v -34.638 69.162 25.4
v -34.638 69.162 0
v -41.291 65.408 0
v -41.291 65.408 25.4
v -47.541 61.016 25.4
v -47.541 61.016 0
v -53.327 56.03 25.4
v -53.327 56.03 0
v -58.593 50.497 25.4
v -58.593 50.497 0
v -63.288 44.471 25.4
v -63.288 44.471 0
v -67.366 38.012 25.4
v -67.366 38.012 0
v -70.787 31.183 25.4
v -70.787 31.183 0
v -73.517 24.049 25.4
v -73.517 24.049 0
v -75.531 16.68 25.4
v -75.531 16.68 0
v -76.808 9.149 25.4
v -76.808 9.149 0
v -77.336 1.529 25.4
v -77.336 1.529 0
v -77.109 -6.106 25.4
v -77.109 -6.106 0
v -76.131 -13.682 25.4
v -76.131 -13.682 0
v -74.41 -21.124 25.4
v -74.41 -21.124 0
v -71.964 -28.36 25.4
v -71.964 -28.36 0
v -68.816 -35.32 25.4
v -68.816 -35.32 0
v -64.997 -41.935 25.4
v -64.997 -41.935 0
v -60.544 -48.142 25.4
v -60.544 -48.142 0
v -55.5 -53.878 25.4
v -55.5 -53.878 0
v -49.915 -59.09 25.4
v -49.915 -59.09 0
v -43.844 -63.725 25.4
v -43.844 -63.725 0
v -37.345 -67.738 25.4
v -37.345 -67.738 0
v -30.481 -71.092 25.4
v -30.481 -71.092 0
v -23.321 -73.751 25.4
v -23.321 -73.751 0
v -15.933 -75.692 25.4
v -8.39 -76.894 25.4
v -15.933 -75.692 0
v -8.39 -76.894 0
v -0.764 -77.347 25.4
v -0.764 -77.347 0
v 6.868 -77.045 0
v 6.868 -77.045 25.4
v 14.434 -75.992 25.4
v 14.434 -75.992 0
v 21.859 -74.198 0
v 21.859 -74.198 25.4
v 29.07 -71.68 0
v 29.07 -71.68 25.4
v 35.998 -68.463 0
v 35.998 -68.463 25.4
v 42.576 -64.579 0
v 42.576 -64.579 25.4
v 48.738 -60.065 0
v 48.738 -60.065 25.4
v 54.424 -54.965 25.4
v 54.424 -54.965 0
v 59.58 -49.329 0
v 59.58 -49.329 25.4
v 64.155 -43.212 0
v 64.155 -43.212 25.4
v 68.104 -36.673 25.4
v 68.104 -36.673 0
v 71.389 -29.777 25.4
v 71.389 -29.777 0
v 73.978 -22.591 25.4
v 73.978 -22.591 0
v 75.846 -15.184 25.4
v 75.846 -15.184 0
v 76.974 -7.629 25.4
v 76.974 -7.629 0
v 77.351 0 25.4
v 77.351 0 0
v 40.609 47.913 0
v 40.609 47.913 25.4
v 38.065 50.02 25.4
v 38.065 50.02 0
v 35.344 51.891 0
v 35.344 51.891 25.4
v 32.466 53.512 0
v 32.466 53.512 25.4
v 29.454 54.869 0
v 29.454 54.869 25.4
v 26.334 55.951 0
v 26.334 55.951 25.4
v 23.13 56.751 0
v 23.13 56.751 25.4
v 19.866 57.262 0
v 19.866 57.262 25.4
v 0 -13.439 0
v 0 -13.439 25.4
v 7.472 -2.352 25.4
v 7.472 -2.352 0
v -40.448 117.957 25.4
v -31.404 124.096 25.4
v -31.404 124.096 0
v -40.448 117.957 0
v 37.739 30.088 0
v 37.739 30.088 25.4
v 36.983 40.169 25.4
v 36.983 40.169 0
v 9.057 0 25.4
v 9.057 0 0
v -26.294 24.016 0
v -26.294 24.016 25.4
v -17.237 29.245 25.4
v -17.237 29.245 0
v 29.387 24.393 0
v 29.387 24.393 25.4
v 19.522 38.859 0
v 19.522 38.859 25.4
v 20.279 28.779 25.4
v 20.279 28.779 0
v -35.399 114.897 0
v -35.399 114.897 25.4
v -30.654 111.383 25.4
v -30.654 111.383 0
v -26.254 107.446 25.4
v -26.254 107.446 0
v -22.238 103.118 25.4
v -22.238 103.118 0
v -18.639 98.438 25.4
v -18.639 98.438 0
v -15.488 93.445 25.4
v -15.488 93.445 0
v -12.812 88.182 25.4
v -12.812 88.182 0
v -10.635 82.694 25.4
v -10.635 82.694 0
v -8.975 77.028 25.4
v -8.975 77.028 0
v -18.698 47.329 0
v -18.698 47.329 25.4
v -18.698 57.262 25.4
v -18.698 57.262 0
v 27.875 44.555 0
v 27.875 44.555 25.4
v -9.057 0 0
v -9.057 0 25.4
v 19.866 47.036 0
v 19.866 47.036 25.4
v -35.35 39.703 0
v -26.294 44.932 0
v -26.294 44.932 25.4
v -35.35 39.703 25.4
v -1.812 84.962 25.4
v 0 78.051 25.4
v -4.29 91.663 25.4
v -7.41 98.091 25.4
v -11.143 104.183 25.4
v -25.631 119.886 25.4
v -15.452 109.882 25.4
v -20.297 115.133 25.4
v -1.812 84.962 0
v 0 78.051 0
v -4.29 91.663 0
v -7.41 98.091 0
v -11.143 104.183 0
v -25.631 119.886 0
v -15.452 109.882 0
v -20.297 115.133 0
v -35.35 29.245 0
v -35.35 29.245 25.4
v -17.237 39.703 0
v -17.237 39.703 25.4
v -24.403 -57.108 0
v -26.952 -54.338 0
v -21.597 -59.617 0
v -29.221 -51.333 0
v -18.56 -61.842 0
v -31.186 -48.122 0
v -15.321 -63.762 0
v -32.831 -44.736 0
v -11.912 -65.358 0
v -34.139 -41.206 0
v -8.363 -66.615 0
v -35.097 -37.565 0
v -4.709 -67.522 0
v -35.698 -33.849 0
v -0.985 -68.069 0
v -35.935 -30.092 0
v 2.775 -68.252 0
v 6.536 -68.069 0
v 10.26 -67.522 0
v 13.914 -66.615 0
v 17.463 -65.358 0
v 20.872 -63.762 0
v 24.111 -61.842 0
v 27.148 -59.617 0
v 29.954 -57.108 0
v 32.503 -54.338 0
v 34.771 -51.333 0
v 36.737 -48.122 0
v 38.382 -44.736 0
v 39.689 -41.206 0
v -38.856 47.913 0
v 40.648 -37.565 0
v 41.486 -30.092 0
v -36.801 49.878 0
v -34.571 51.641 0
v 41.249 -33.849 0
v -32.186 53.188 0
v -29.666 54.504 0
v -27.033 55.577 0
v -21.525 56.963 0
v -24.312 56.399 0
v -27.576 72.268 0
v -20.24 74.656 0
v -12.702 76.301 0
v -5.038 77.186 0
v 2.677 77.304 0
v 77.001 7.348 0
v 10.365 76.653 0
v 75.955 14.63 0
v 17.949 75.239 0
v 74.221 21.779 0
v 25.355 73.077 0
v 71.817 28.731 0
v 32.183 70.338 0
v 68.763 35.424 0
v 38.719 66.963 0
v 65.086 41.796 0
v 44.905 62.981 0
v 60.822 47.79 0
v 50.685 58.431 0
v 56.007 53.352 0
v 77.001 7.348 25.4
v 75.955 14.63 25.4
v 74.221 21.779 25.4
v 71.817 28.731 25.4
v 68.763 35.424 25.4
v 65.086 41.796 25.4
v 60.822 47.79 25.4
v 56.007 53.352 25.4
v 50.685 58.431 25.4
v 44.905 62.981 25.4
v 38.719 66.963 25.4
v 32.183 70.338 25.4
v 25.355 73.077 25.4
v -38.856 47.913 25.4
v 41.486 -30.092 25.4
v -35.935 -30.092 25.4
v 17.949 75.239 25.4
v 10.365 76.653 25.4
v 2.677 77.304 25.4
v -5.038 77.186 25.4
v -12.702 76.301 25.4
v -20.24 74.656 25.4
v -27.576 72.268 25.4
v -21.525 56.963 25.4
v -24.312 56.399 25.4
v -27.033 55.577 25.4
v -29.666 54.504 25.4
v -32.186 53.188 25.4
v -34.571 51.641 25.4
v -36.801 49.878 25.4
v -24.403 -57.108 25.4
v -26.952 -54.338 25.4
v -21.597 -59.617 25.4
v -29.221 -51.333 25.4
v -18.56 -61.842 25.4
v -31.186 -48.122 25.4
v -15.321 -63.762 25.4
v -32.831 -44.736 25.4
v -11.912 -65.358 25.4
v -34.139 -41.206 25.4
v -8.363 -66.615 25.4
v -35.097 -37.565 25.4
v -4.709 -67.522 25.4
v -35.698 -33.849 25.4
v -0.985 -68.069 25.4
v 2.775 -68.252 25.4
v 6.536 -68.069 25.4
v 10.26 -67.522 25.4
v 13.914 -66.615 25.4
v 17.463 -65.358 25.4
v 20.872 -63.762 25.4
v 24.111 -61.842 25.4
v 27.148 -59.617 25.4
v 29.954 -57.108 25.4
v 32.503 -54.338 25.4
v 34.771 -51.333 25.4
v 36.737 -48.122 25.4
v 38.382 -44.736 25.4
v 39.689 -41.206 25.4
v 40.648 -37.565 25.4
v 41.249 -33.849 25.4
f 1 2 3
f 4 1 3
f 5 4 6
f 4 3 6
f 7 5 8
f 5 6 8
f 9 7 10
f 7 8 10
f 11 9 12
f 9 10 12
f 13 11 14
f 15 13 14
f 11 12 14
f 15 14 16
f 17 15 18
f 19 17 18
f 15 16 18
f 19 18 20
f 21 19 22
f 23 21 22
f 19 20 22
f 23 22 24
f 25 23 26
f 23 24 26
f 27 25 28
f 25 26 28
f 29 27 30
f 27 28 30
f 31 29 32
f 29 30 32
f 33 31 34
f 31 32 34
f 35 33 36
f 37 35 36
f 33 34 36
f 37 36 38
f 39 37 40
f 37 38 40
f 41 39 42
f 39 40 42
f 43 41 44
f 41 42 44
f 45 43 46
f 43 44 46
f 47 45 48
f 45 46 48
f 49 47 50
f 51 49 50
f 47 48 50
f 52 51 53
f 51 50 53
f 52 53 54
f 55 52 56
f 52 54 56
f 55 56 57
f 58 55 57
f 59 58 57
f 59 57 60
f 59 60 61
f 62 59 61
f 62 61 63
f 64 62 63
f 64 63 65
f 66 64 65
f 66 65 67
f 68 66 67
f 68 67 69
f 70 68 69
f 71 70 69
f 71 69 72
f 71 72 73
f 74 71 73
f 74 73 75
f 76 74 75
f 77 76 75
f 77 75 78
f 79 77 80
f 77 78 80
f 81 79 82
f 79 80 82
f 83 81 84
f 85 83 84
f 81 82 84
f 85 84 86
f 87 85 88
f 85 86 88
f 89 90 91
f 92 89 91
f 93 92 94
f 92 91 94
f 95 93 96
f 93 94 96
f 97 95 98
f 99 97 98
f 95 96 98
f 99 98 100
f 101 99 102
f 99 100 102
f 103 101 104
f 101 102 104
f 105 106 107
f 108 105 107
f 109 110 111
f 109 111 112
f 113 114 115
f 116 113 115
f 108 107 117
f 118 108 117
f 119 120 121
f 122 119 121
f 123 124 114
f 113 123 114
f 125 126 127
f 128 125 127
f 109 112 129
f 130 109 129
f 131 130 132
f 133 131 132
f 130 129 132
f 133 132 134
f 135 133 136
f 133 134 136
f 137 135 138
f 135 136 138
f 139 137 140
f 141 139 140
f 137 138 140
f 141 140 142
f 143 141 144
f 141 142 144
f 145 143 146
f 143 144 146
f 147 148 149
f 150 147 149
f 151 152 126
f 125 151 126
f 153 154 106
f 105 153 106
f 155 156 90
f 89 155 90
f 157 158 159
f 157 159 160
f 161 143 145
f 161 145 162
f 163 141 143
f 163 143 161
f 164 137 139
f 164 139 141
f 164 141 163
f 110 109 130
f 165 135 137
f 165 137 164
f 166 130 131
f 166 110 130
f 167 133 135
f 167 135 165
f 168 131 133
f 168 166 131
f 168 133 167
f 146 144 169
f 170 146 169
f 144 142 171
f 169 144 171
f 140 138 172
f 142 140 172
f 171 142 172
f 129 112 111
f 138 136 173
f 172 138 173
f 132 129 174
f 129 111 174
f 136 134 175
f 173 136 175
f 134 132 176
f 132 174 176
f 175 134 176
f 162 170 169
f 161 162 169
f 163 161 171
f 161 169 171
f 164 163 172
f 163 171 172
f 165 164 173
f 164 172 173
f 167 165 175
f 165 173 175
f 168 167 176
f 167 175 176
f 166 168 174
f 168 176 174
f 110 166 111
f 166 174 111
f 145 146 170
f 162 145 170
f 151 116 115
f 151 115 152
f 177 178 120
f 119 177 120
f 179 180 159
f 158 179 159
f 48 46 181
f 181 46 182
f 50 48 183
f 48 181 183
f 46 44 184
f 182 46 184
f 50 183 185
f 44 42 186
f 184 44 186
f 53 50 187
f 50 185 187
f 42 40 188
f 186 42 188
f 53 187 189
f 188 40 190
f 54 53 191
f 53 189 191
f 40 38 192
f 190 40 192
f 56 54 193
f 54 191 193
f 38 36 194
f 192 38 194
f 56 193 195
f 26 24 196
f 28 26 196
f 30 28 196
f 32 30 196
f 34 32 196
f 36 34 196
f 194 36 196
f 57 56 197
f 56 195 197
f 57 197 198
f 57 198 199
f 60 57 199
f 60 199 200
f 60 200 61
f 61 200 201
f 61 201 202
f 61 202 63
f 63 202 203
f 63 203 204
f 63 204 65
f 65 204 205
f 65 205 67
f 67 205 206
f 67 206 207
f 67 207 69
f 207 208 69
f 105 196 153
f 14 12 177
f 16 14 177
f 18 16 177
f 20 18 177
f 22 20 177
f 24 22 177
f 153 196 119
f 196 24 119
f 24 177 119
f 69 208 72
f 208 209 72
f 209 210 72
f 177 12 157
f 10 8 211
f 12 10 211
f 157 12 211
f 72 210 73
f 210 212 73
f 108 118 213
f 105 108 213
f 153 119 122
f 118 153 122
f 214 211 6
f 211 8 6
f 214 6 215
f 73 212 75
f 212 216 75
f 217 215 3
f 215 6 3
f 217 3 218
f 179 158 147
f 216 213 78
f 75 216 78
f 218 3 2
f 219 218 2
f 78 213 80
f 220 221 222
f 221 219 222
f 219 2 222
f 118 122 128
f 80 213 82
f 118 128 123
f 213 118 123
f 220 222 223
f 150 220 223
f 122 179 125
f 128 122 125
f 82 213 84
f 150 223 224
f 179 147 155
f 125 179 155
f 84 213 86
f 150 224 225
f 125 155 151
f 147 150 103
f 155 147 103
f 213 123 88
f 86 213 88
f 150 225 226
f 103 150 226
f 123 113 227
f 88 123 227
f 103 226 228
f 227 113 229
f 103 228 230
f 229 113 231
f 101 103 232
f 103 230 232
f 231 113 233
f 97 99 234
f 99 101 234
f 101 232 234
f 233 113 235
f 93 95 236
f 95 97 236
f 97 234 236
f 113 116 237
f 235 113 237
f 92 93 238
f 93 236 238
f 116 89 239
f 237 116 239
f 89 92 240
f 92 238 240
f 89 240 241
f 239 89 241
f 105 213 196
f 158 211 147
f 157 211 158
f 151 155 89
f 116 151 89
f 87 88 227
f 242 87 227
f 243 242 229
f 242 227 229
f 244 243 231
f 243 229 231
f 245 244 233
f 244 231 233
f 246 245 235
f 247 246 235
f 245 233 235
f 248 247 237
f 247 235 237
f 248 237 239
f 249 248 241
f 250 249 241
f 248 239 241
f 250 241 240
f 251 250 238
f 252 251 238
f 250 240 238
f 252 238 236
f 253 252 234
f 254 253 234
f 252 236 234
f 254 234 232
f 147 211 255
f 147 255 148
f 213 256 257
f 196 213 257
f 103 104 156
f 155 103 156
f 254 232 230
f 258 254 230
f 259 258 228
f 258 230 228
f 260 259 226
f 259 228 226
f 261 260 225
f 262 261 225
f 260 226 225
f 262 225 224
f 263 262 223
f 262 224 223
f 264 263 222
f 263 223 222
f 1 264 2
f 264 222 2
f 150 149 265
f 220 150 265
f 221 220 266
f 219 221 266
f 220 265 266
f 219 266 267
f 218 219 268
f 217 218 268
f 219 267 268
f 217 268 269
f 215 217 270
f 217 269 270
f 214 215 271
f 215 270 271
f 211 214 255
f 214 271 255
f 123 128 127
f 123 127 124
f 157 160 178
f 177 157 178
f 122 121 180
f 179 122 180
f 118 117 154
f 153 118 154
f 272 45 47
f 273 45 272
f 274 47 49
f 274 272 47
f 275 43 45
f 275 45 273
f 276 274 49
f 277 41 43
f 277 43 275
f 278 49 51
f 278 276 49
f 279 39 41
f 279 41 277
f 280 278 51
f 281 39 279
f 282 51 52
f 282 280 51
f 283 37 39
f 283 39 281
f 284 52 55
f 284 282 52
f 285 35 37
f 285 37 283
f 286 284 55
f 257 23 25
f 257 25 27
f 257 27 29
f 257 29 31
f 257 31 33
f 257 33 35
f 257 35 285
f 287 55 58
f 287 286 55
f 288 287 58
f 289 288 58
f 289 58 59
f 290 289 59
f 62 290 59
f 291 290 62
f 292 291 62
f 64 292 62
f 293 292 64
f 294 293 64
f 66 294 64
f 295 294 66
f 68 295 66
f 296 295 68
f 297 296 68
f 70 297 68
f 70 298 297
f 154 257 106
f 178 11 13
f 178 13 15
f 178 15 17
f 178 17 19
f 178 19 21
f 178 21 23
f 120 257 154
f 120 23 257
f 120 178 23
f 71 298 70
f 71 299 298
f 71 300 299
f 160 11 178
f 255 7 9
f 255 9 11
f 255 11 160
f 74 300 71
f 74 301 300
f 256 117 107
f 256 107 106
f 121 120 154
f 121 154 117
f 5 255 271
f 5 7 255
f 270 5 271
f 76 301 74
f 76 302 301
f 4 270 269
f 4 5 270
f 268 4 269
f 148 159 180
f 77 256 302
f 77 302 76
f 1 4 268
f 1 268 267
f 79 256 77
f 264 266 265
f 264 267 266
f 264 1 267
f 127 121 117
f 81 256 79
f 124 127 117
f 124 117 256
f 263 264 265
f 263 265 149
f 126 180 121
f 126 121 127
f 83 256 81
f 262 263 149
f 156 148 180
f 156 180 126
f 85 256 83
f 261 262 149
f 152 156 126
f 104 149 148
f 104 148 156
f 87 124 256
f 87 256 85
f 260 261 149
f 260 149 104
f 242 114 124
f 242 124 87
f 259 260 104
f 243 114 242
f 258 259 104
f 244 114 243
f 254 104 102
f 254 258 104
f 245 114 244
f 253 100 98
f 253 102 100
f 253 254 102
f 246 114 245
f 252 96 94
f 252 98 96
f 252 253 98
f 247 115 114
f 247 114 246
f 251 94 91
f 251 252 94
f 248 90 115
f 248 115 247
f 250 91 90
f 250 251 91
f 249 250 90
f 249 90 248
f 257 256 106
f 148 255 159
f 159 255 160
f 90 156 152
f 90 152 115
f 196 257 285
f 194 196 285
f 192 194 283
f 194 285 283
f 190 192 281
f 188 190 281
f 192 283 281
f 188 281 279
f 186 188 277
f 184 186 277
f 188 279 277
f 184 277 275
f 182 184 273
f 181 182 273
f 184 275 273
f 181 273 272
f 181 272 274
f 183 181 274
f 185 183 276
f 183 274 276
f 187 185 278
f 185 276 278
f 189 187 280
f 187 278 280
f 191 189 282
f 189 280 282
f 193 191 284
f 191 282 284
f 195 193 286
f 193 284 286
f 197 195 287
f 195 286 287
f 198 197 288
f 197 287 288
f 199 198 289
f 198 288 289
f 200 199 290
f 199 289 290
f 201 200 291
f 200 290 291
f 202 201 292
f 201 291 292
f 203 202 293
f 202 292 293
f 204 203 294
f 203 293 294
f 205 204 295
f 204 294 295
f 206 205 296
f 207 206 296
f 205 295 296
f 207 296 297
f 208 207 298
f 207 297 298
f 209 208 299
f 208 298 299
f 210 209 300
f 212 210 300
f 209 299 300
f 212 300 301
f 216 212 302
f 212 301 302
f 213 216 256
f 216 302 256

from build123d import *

# Parameters (mm, degrees)
F1_DEPTH  = 25.4
F3_DEPTH  = 25.4
F5_DEPTH  = 25.4
F7_DEPTH  = 25.4
F9_DEPTH  = 25.4
F11_DEPTH = 25.4


with BuildPart() as f1:
    # F0 (on Top) → F1 (new body)
    with BuildSketch(Plane.XY):
        with BuildLine():
            ThreePointArc((-34.638211, 69.161595), (-40.64383, -65.811937), (77.350707, 0))
            ThreePointArc((77.350707, 0), (63.02527, 44.843587), (25.355131, 73.077009))
            ThreePointArc((25.355131, 73.077009), (-5.037511, 77.186498), (-34.638211, 69.161595))
        make_face()
    extrude(amount=F1_DEPTH)

    # F2 (on face) → F3 (cut)
    with BuildSketch(Plane.XY.offset(25.4)):
        Polygon((7.471595, -2.352105), (-9.056711, 0), (0, -13.438989), align=None)
        Polygon((9.05671, 0), (-9.056711, 0), (7.471595, -2.352105), align=None)
    extrude(amount=-F3_DEPTH, mode=Mode.SUBTRACT)

    # F4 (on face) → F5 (cut)
    with BuildSketch(Plane.XY.offset(25.4)):
        with BuildLine():
            Line((-18.697726, 47.328614), (-18.697726, 57.261784))
            ThreePointArc((-18.697726, 57.261784), (-29.665699, 54.503678), (-38.856208, 47.912918))
            Line((-38.856208, 47.912918), (-18.697726, 47.328614))
        make_face()
        with BuildLine():
            Line((19.866332, 47.036462), (40.609121, 47.912918))
            ThreePointArc((40.609121, 47.912918), (30.975257, 54.223746), (19.866332, 57.261784))
            Line((19.866332, 57.261784), (19.866332, 47.036462))
        make_face()
    extrude(amount=-F5_DEPTH, mode=Mode.SUBTRACT)

    # F6 (on face) → F7 (cut)
    with BuildSketch(Plane.XY.offset(25.4)):
        Polygon((-17.236965, 29.245036), (-17.236965, 39.702823), (-26.293674, 44.931717), (-35.350384, 39.702823), (-35.350384, 29.245036), (-26.293674, 24.016142), align=None)
        Polygon((36.983062, 40.169268), (27.874667, 44.554793), (19.522494, 38.859455), (20.278715, 28.778591), (29.387109, 24.393066), (37.739283, 30.088404), align=None)
    extrude(amount=-F7_DEPTH, mode=Mode.SUBTRACT)

    # F8 (on face) → F9 (cut)
    with BuildSketch(Plane.XY.offset(25.4)):
        with BuildLine():
            Line((41.485578, -30.091651), (-35.934687, -30.091651))
            ThreePointArc((-35.934687, -30.091651), (2.775446, -68.251941), (41.485578, -30.091651))
        make_face()
    extrude(amount=-F9_DEPTH, mode=Mode.SUBTRACT)


with BuildPart() as f11:
    # F10 (on Top) → F11 (new body)
    with BuildSketch(Plane.XY):
        with BuildLine():
            ThreePointArc((-40.448051, 117.956847), (-20.384209, 100.819767), (-8.974507, 77.027835))
            Line((-8.974507, 77.027835), (0, 78.05106))
            ThreePointArc((0, 78.05106), (-11.142767, 104.183116), (-31.403929, 124.0962))
            Line((-31.403929, 124.0962), (-40.448051, 117.956847))
        make_face()
    extrude(amount=F11_DEPTH)


solid = Compound([f1.part, f11.part])
